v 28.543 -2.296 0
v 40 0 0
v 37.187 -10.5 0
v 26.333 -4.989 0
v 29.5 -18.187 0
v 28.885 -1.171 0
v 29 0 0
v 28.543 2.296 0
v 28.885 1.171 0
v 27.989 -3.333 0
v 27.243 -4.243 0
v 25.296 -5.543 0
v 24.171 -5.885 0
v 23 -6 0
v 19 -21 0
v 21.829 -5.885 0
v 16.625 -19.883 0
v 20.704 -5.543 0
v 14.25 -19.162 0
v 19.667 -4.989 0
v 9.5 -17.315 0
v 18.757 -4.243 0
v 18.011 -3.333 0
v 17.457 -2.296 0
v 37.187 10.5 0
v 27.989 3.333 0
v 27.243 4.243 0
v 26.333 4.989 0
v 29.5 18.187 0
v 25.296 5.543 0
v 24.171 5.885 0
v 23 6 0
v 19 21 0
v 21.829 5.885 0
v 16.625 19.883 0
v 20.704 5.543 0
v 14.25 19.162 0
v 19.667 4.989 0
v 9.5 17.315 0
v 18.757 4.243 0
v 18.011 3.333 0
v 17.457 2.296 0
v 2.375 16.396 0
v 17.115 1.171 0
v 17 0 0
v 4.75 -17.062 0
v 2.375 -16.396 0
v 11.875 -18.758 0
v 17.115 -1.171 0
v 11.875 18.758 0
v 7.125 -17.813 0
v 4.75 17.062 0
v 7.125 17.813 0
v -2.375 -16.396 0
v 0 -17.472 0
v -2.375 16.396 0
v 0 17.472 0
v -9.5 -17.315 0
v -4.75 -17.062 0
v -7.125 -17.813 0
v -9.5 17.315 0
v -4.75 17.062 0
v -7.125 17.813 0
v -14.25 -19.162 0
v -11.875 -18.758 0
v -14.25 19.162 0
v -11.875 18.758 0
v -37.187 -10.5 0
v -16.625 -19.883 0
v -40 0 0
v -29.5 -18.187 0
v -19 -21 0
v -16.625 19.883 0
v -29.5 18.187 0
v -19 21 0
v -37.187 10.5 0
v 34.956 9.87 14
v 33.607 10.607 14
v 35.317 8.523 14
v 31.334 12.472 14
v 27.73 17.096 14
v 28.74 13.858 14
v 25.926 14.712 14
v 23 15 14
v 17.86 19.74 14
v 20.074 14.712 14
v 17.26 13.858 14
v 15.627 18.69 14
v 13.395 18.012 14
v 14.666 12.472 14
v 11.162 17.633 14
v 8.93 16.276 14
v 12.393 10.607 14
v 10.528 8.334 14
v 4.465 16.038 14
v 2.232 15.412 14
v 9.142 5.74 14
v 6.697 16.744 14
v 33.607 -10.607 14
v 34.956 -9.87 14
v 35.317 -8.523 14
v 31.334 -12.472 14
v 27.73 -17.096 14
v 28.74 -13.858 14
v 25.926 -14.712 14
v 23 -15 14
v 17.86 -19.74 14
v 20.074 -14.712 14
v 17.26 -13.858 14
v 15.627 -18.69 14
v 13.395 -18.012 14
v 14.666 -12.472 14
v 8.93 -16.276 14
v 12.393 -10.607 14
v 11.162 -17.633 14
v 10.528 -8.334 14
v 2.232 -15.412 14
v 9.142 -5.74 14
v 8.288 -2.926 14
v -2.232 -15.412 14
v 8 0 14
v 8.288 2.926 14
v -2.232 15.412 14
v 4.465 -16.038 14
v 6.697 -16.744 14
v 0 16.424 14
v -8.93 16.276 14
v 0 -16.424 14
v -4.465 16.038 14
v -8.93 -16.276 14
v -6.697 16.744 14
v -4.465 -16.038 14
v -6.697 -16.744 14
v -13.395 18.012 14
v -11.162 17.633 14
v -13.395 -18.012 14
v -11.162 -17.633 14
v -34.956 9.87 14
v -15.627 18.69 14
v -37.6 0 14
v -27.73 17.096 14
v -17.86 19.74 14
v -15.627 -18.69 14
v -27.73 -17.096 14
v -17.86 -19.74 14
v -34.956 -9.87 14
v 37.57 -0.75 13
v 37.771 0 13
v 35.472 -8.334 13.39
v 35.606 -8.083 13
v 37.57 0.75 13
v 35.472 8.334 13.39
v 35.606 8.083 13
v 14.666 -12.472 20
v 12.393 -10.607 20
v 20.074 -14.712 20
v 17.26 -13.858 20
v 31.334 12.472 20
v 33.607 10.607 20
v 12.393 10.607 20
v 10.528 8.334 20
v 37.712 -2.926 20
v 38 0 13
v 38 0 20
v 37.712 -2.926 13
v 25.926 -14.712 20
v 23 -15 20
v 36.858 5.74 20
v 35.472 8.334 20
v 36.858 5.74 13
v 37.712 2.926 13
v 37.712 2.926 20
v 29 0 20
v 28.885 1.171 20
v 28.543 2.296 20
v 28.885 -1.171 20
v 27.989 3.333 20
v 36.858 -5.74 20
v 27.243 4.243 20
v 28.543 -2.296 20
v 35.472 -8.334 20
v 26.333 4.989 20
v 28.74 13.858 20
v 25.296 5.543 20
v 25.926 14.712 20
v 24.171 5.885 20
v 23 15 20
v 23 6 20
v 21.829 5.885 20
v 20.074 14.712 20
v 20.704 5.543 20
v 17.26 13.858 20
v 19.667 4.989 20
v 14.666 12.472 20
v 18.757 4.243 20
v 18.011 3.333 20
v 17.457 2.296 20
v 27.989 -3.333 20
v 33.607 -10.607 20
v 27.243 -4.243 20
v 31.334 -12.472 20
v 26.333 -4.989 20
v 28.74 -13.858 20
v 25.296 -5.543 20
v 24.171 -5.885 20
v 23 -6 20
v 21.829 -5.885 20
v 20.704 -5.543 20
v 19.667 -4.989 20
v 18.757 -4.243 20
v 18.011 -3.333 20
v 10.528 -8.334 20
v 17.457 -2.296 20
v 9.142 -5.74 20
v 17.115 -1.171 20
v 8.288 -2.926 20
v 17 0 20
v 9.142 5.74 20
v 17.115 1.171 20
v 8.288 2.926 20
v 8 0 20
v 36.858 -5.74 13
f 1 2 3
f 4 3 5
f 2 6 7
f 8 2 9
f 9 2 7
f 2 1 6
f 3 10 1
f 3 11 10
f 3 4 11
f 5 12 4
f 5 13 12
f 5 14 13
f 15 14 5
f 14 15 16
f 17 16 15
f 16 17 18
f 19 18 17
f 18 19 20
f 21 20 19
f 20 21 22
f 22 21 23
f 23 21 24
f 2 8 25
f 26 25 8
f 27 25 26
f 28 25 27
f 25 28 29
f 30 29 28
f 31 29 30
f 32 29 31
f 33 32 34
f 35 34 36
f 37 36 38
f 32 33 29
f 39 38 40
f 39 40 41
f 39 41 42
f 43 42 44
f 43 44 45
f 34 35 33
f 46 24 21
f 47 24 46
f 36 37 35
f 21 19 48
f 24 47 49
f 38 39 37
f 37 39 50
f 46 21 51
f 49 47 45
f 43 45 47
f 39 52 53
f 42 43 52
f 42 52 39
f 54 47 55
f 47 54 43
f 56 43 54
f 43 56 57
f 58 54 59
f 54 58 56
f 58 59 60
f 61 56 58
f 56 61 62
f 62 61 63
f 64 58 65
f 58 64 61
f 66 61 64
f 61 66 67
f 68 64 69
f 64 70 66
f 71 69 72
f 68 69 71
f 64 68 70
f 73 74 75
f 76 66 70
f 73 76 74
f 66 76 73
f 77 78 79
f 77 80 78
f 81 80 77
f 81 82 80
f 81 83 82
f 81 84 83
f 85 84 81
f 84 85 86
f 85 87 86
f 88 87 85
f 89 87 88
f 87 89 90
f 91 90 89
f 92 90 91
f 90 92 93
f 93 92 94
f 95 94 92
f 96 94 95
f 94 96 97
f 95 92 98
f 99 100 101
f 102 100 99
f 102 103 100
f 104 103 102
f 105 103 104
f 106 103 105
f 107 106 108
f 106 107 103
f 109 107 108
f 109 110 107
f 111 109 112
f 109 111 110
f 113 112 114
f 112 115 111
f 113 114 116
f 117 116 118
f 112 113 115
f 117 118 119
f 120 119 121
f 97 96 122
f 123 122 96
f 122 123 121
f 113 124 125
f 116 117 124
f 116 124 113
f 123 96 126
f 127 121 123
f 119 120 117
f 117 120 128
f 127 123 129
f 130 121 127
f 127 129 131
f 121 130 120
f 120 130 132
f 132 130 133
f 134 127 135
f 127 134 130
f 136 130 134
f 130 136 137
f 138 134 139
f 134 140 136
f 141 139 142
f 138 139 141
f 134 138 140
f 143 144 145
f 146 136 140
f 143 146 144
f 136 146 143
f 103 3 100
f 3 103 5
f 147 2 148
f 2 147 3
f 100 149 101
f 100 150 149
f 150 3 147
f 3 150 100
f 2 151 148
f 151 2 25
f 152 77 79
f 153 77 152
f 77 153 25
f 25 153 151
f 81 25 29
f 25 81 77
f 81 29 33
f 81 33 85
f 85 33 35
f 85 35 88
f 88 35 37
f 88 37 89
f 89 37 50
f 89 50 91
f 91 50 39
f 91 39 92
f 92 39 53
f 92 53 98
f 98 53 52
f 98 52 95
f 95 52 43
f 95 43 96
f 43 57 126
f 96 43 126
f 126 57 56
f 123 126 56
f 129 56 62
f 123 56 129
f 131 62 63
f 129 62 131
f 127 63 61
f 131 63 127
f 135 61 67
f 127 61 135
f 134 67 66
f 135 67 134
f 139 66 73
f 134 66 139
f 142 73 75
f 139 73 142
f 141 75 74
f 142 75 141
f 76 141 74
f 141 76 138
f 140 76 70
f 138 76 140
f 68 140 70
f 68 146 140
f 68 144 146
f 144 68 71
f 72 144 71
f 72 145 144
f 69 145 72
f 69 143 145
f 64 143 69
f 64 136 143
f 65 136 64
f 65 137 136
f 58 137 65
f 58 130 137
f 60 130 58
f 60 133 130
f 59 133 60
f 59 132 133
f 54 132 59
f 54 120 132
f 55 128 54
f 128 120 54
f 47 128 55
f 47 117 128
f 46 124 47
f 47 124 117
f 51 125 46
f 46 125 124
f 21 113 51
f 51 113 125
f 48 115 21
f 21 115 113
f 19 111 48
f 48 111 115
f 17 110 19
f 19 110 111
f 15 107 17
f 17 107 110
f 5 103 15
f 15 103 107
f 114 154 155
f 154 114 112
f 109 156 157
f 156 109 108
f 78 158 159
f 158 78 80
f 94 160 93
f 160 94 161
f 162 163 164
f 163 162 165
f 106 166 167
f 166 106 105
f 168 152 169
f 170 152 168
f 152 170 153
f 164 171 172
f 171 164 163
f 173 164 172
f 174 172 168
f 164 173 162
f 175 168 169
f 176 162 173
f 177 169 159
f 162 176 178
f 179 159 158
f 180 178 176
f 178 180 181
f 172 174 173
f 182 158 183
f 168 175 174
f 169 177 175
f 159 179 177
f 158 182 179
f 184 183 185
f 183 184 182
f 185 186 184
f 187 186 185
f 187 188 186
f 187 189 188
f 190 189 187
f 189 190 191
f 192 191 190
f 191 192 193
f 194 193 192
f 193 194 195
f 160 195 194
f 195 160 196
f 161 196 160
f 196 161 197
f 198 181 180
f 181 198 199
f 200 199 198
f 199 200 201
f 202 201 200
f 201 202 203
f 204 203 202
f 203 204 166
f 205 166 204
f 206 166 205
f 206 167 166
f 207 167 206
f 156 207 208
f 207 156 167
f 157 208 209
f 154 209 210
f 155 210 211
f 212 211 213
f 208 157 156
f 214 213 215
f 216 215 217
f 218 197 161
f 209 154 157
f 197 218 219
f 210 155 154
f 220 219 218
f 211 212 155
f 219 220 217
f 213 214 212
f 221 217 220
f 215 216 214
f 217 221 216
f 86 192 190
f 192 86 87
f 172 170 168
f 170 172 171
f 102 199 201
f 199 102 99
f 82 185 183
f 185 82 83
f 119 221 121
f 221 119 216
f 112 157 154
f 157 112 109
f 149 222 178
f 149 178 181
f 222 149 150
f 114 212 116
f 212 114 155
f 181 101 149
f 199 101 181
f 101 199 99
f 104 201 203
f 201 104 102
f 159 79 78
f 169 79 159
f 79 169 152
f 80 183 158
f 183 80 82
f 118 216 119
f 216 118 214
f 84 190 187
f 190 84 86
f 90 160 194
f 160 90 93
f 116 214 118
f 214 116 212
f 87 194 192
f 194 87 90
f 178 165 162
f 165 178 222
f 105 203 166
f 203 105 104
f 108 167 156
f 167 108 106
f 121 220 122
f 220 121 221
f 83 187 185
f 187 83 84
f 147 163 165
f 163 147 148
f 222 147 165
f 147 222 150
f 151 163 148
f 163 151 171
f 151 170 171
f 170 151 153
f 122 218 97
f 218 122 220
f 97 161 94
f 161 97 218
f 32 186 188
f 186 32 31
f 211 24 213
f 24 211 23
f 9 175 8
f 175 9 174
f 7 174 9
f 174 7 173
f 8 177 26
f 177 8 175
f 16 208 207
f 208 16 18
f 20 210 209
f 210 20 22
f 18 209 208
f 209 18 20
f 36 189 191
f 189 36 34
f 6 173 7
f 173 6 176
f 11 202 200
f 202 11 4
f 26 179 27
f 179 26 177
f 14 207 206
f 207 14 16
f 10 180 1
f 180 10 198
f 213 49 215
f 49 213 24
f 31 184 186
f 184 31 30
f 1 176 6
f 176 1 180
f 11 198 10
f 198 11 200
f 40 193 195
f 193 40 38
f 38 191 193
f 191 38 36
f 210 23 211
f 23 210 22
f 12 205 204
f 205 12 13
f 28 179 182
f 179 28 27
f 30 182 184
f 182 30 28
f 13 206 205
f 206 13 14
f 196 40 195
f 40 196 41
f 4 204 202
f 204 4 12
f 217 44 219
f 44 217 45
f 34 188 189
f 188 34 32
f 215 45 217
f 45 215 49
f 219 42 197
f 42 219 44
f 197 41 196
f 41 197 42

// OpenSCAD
$fn = 32;

// ----------------------------------------------------------------------
// Handle: 80 x 42 mm grip, 14 mm thick
// ----------------------------------------------------------------------

// --- parameters (mm) ---
length = 80;              // grip length
width = 42;               // grip width
thickness = 14;           // grip thickness
waist = 0.8;              // width factor at the middle
draft = 0.94;             // top face scale of the extrusion
scallops = 6;             // finger rests per side
ripple = 0.04;            // depth factor of the finger rests
boss_d = 30;              // mounting boss diameter
boss_h = 6;               // mounting boss height
boss_hole_d = 12;         // screw clearance through the boss
boss_r = 23;              // boss centre from the grip centre

/* ergonomic grip outline, closed spline-like polygon in the XY plane */
grip = [[-19, 21], [-16.625, 19.883], [-14.25, 19.162], [-11.875, 18.758], [-9.5, 17.315], [-7.125, 17.813], [-4.75, 17.062], [-2.375, 16.396], [0, 17.472], [2.375, 16.396], [4.75, 17.062], [7.125, 17.813], [9.5, 17.315], [11.875, 18.758], [14.25, 19.162], [16.625, 19.883], [19, 21], [29.5, 18.187], [37.187, 10.5], [40, 0], [37.187, -10.5], [29.5, -18.187], [19, -21], [19, -21], [16.625, -19.883], [14.25, -19.162], [11.875, -18.758], [9.5, -17.315], [7.125, -17.813], [4.75, -17.062], [2.375, -16.396], [0, -17.472], [-2.375, -16.396], [-4.75, -17.062], [-7.125, -17.813], [-9.5, -17.315], [-11.875, -18.758], [-14.25, -19.162], [-16.625, -19.883], [-19, -21], [-29.5, -18.187], [-37.187, -10.5], [-40, 0], [-37.187, 10.5], [-29.5, 18.187], [-19, 21]];

module grip_body() {
  linear_extrude(height = thickness, scale = draft) polygon(grip);
}

module boss_body() {
  /* sunk 1 mm into the grip so the joint overlaps */
  translate([boss_r, 0, thickness - 1]) cylinder(h = boss_h + 1, d = boss_d);
}

difference() {
  union() {
    grip_body();
    boss_body();
  }
  translate([boss_r, 0, -1]) cylinder(h = thickness + boss_h + 2, d = boss_hole_d);
}
